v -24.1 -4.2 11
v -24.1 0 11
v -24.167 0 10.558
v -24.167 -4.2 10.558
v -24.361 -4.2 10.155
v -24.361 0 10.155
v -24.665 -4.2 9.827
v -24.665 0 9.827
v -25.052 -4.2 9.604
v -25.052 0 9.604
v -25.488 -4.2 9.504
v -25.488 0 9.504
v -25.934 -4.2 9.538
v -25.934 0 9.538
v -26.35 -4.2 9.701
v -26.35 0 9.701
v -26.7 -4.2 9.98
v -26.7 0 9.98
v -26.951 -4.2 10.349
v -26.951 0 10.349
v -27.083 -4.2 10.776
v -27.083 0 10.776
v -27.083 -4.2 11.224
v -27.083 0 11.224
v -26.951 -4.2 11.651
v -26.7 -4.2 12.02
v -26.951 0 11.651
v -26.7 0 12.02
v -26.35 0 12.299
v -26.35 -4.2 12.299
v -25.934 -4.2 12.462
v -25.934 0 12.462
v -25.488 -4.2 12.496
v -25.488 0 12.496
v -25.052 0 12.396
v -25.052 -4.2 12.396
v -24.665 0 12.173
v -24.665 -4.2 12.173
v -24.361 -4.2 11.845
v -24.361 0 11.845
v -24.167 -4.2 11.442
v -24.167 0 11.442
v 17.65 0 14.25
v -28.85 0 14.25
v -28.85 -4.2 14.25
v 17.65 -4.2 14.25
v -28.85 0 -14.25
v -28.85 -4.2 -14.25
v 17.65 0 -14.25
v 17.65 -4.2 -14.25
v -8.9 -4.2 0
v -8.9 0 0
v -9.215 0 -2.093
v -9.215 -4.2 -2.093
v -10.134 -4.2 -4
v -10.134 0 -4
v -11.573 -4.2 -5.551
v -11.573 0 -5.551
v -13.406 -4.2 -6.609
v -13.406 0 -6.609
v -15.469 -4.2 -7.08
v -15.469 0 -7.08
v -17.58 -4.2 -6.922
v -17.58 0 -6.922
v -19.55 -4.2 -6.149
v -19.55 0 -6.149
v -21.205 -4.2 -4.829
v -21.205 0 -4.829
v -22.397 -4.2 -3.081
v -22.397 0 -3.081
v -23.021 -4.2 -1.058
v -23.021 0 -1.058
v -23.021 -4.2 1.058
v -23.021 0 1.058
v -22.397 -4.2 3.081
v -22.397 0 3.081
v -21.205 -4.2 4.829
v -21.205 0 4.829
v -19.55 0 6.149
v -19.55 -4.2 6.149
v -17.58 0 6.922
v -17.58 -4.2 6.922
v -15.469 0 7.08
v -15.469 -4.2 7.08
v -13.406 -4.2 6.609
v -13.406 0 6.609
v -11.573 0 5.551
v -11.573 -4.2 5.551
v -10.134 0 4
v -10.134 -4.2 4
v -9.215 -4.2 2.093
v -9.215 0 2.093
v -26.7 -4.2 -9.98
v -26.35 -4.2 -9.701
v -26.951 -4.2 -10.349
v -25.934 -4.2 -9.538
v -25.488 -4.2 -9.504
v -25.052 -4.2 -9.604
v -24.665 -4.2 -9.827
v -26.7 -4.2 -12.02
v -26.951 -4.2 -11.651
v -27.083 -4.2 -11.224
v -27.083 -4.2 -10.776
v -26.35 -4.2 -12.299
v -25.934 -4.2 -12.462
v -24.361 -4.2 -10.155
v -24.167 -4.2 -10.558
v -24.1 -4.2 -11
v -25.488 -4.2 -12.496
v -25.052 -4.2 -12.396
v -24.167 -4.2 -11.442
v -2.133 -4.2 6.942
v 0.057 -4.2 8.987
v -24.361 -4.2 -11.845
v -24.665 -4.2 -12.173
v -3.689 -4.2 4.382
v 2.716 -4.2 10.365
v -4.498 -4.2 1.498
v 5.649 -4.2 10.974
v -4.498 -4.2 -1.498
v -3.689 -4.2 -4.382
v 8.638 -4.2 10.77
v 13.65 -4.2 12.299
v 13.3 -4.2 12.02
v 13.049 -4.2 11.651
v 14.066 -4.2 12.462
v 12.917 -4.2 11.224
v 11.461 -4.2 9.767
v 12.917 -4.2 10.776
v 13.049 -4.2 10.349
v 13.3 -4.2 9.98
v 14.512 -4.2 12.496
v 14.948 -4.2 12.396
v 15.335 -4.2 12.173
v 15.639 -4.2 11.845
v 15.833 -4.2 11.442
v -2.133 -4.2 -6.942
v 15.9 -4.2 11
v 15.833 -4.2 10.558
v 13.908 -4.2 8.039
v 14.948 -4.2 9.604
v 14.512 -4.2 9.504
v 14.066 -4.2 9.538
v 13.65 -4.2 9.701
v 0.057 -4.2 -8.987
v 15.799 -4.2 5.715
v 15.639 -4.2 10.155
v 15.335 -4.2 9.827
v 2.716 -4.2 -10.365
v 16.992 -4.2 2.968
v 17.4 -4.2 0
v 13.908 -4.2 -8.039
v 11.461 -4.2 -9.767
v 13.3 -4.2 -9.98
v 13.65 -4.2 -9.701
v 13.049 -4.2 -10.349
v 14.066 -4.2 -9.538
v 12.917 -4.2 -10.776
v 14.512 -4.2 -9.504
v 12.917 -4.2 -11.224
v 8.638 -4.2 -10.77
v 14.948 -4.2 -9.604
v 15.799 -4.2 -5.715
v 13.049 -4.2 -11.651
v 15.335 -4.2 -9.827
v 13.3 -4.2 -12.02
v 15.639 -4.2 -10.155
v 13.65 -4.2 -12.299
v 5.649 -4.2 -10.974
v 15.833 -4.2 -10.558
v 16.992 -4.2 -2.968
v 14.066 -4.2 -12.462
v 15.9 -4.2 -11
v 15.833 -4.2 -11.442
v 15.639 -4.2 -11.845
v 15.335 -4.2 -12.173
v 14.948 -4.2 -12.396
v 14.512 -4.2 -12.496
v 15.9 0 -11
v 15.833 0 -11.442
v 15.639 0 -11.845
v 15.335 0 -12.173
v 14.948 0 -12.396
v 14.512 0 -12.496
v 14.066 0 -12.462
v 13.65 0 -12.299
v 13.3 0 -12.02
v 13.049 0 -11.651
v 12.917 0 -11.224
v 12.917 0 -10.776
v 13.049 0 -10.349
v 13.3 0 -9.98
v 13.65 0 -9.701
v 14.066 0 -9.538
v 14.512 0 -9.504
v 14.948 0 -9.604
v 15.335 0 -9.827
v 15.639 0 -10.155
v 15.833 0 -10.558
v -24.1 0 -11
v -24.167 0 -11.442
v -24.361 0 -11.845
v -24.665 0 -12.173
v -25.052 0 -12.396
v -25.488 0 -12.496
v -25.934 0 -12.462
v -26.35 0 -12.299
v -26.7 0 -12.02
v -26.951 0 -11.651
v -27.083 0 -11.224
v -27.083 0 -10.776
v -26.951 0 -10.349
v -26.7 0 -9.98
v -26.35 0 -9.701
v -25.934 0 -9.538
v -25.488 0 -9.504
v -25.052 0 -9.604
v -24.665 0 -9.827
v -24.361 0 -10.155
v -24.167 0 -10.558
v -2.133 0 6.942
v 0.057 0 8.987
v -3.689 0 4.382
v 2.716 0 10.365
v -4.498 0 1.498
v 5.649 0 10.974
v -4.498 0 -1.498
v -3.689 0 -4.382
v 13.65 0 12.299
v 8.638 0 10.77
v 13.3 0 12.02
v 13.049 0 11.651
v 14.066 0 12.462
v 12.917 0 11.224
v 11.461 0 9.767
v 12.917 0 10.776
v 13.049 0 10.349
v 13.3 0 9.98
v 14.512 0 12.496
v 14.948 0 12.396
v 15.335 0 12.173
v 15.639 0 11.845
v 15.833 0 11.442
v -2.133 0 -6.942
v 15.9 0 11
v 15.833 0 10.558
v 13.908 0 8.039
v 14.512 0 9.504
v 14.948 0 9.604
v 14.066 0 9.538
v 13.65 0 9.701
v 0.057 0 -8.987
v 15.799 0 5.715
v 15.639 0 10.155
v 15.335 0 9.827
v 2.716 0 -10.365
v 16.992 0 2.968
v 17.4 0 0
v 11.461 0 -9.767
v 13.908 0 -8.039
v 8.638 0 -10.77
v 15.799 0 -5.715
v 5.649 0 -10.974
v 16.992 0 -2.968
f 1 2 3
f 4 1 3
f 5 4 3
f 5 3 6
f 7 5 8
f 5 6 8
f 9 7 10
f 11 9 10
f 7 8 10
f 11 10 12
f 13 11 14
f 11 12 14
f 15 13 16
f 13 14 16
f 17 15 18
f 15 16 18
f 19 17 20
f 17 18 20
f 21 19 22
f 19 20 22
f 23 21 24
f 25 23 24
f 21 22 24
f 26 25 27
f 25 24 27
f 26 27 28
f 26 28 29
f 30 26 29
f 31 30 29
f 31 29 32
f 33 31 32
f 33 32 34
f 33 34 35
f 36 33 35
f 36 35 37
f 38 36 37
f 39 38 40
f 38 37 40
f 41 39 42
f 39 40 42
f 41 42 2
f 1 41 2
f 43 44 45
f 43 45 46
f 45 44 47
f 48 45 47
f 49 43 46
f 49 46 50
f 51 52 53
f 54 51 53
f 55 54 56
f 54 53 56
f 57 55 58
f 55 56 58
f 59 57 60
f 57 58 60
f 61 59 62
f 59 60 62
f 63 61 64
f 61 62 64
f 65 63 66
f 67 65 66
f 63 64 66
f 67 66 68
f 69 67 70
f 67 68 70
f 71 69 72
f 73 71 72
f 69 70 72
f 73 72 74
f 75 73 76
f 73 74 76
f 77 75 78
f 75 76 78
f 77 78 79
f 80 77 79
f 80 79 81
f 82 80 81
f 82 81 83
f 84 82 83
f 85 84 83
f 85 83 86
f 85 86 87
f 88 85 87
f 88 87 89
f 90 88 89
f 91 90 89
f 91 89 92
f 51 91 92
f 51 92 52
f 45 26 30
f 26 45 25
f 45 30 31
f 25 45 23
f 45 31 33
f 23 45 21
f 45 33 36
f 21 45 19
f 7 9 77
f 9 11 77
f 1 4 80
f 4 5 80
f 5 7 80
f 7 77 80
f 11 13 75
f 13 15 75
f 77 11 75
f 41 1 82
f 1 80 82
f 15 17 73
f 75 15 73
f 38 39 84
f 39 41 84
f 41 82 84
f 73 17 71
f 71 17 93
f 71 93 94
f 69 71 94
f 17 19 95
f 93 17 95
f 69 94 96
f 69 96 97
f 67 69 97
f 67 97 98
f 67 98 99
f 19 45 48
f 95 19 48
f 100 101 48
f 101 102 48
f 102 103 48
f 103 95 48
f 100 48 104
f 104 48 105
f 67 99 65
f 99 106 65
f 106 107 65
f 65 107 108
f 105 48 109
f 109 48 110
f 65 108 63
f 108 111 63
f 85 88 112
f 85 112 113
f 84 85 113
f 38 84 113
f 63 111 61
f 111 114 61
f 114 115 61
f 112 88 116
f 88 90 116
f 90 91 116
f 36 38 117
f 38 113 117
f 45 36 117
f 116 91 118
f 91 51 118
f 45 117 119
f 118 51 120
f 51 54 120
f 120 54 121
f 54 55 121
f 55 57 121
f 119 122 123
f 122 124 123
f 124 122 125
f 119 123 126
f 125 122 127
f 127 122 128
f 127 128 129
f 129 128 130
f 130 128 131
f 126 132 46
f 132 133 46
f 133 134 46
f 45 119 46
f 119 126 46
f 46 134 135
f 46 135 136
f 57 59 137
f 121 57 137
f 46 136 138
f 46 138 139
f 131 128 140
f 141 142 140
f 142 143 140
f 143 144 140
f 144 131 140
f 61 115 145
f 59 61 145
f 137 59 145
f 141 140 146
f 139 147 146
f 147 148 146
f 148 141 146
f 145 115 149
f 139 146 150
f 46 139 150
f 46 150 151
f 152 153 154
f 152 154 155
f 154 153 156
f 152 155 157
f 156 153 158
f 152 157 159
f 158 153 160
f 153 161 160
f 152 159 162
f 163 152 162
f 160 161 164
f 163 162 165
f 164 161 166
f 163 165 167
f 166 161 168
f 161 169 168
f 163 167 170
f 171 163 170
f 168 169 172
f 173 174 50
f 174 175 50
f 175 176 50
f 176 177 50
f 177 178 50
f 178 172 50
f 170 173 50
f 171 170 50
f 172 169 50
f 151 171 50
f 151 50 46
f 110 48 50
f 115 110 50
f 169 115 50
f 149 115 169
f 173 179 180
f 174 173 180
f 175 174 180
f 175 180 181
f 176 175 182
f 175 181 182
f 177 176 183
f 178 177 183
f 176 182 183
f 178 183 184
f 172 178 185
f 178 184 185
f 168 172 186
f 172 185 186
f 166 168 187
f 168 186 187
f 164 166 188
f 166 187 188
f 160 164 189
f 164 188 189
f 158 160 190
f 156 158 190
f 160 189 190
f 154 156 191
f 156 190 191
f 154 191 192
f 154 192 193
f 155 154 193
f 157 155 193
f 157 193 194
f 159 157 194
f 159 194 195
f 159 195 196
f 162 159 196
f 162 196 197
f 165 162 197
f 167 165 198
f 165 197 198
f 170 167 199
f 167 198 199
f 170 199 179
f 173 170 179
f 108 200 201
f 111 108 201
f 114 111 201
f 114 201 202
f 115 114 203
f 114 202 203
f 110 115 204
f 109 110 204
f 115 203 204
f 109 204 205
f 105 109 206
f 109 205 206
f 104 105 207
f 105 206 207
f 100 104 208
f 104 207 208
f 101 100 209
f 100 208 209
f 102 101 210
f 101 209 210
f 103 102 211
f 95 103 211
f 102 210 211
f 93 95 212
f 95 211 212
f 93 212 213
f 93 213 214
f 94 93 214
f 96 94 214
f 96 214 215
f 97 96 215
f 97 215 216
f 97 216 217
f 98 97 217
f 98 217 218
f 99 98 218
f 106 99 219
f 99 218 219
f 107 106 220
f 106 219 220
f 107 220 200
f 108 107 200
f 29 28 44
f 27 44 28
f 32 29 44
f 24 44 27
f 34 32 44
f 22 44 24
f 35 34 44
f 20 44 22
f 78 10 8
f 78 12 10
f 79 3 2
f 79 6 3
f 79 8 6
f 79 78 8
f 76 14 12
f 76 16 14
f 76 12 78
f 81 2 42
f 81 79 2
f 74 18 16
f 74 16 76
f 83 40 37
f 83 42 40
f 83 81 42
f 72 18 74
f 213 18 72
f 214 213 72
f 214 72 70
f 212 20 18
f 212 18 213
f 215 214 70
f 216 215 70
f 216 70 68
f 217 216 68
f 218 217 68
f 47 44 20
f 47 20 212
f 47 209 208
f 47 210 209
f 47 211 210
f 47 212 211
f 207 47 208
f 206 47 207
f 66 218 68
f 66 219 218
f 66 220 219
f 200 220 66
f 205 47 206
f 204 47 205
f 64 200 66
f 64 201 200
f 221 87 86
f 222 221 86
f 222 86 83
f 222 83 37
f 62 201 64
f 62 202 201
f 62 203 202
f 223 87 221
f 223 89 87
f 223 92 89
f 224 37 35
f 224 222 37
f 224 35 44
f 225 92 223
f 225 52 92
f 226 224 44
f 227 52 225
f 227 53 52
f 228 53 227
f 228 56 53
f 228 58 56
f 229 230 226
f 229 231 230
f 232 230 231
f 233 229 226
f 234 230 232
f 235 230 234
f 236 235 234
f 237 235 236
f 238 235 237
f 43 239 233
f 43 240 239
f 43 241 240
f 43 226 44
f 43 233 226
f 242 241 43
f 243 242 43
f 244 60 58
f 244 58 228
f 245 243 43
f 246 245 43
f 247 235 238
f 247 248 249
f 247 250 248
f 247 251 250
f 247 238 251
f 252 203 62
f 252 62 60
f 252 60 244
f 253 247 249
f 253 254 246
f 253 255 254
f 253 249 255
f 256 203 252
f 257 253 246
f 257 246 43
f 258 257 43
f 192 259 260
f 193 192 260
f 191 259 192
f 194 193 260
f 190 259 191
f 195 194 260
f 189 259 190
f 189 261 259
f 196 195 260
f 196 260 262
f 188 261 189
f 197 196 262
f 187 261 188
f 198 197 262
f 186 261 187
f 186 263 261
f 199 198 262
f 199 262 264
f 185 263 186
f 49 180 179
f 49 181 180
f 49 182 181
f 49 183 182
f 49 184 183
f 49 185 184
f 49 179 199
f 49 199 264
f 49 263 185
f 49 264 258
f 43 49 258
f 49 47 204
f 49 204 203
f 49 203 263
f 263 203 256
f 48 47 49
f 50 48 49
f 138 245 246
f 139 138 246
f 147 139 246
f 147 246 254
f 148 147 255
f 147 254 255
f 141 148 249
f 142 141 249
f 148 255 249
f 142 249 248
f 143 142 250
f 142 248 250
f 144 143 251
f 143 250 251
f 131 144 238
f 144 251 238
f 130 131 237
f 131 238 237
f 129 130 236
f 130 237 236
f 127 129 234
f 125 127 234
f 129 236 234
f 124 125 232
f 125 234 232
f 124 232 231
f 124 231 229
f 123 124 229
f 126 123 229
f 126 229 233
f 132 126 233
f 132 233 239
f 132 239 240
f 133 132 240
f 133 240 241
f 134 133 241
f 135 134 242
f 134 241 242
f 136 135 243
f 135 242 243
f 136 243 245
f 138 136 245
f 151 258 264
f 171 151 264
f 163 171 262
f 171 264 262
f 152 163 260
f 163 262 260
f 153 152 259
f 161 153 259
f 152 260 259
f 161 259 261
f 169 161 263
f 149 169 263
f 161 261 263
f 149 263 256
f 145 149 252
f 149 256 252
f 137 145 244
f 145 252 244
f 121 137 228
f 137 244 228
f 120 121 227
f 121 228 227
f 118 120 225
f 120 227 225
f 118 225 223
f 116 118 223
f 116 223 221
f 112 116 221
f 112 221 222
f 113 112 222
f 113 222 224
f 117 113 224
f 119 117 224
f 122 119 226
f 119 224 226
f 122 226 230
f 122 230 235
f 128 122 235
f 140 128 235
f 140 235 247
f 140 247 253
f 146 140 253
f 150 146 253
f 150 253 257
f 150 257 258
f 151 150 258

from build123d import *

# Parameters (mm, degrees)
SKETCH11_W          = 46.5
SKETCH11_H          = 28.5
SKETCH11_R          = 1.5
BOSS_EXTRUDE3_DEPTH = 4.2
SKETCH12_R          = 11
CUT_EXTRUDE6_DEPTH  = 5.2
SKETCH13_R          = 7.1
CUT_EXTRUDE7_DEPTH  = 5.2


with BuildPart() as part:
    # Sketch11 → Boss-Extrude3 (new body)
    with BuildSketch(Plane(origin=(0, 0, 0), x_dir=(1, 0, 0), z_dir=(0, 1, 0))):
        with Locations((-5.6, 0)):
            Rectangle(SKETCH11_W, SKETCH11_H)
        with Locations((-25.6, 11)):
            Circle(SKETCH11_R, mode=Mode.SUBTRACT)
        with Locations((14.4, 11)):
            Circle(SKETCH11_R, mode=Mode.SUBTRACT)
        with Locations((14.4, -11)):
            Circle(SKETCH11_R, mode=Mode.SUBTRACT)
        with Locations((-25.6, -11)):
            Circle(SKETCH11_R, mode=Mode.SUBTRACT)
    extrude(amount=-BOSS_EXTRUDE3_DEPTH)

    # Sketch12 → Cut-Extrude6 (cut, through all)
    with BuildSketch(Plane(origin=(0, 0, 0), x_dir=(1, 0, 0), z_dir=(0, 1, 0))):
        with Locations((6.4, 0)):
            Circle(SKETCH12_R)
    extrude(amount=-CUT_EXTRUDE6_DEPTH, mode=Mode.SUBTRACT)

    # Sketch13 → Cut-Extrude7 (cut, through all)
    with BuildSketch(Plane(origin=(0, 0, 0), x_dir=(1, 0, 0), z_dir=(0, 1, 0))):
        with Locations((-16, 0)):
            Circle(SKETCH13_R)
    extrude(amount=-CUT_EXTRUDE7_DEPTH, mode=Mode.SUBTRACT)


solid = part.part
